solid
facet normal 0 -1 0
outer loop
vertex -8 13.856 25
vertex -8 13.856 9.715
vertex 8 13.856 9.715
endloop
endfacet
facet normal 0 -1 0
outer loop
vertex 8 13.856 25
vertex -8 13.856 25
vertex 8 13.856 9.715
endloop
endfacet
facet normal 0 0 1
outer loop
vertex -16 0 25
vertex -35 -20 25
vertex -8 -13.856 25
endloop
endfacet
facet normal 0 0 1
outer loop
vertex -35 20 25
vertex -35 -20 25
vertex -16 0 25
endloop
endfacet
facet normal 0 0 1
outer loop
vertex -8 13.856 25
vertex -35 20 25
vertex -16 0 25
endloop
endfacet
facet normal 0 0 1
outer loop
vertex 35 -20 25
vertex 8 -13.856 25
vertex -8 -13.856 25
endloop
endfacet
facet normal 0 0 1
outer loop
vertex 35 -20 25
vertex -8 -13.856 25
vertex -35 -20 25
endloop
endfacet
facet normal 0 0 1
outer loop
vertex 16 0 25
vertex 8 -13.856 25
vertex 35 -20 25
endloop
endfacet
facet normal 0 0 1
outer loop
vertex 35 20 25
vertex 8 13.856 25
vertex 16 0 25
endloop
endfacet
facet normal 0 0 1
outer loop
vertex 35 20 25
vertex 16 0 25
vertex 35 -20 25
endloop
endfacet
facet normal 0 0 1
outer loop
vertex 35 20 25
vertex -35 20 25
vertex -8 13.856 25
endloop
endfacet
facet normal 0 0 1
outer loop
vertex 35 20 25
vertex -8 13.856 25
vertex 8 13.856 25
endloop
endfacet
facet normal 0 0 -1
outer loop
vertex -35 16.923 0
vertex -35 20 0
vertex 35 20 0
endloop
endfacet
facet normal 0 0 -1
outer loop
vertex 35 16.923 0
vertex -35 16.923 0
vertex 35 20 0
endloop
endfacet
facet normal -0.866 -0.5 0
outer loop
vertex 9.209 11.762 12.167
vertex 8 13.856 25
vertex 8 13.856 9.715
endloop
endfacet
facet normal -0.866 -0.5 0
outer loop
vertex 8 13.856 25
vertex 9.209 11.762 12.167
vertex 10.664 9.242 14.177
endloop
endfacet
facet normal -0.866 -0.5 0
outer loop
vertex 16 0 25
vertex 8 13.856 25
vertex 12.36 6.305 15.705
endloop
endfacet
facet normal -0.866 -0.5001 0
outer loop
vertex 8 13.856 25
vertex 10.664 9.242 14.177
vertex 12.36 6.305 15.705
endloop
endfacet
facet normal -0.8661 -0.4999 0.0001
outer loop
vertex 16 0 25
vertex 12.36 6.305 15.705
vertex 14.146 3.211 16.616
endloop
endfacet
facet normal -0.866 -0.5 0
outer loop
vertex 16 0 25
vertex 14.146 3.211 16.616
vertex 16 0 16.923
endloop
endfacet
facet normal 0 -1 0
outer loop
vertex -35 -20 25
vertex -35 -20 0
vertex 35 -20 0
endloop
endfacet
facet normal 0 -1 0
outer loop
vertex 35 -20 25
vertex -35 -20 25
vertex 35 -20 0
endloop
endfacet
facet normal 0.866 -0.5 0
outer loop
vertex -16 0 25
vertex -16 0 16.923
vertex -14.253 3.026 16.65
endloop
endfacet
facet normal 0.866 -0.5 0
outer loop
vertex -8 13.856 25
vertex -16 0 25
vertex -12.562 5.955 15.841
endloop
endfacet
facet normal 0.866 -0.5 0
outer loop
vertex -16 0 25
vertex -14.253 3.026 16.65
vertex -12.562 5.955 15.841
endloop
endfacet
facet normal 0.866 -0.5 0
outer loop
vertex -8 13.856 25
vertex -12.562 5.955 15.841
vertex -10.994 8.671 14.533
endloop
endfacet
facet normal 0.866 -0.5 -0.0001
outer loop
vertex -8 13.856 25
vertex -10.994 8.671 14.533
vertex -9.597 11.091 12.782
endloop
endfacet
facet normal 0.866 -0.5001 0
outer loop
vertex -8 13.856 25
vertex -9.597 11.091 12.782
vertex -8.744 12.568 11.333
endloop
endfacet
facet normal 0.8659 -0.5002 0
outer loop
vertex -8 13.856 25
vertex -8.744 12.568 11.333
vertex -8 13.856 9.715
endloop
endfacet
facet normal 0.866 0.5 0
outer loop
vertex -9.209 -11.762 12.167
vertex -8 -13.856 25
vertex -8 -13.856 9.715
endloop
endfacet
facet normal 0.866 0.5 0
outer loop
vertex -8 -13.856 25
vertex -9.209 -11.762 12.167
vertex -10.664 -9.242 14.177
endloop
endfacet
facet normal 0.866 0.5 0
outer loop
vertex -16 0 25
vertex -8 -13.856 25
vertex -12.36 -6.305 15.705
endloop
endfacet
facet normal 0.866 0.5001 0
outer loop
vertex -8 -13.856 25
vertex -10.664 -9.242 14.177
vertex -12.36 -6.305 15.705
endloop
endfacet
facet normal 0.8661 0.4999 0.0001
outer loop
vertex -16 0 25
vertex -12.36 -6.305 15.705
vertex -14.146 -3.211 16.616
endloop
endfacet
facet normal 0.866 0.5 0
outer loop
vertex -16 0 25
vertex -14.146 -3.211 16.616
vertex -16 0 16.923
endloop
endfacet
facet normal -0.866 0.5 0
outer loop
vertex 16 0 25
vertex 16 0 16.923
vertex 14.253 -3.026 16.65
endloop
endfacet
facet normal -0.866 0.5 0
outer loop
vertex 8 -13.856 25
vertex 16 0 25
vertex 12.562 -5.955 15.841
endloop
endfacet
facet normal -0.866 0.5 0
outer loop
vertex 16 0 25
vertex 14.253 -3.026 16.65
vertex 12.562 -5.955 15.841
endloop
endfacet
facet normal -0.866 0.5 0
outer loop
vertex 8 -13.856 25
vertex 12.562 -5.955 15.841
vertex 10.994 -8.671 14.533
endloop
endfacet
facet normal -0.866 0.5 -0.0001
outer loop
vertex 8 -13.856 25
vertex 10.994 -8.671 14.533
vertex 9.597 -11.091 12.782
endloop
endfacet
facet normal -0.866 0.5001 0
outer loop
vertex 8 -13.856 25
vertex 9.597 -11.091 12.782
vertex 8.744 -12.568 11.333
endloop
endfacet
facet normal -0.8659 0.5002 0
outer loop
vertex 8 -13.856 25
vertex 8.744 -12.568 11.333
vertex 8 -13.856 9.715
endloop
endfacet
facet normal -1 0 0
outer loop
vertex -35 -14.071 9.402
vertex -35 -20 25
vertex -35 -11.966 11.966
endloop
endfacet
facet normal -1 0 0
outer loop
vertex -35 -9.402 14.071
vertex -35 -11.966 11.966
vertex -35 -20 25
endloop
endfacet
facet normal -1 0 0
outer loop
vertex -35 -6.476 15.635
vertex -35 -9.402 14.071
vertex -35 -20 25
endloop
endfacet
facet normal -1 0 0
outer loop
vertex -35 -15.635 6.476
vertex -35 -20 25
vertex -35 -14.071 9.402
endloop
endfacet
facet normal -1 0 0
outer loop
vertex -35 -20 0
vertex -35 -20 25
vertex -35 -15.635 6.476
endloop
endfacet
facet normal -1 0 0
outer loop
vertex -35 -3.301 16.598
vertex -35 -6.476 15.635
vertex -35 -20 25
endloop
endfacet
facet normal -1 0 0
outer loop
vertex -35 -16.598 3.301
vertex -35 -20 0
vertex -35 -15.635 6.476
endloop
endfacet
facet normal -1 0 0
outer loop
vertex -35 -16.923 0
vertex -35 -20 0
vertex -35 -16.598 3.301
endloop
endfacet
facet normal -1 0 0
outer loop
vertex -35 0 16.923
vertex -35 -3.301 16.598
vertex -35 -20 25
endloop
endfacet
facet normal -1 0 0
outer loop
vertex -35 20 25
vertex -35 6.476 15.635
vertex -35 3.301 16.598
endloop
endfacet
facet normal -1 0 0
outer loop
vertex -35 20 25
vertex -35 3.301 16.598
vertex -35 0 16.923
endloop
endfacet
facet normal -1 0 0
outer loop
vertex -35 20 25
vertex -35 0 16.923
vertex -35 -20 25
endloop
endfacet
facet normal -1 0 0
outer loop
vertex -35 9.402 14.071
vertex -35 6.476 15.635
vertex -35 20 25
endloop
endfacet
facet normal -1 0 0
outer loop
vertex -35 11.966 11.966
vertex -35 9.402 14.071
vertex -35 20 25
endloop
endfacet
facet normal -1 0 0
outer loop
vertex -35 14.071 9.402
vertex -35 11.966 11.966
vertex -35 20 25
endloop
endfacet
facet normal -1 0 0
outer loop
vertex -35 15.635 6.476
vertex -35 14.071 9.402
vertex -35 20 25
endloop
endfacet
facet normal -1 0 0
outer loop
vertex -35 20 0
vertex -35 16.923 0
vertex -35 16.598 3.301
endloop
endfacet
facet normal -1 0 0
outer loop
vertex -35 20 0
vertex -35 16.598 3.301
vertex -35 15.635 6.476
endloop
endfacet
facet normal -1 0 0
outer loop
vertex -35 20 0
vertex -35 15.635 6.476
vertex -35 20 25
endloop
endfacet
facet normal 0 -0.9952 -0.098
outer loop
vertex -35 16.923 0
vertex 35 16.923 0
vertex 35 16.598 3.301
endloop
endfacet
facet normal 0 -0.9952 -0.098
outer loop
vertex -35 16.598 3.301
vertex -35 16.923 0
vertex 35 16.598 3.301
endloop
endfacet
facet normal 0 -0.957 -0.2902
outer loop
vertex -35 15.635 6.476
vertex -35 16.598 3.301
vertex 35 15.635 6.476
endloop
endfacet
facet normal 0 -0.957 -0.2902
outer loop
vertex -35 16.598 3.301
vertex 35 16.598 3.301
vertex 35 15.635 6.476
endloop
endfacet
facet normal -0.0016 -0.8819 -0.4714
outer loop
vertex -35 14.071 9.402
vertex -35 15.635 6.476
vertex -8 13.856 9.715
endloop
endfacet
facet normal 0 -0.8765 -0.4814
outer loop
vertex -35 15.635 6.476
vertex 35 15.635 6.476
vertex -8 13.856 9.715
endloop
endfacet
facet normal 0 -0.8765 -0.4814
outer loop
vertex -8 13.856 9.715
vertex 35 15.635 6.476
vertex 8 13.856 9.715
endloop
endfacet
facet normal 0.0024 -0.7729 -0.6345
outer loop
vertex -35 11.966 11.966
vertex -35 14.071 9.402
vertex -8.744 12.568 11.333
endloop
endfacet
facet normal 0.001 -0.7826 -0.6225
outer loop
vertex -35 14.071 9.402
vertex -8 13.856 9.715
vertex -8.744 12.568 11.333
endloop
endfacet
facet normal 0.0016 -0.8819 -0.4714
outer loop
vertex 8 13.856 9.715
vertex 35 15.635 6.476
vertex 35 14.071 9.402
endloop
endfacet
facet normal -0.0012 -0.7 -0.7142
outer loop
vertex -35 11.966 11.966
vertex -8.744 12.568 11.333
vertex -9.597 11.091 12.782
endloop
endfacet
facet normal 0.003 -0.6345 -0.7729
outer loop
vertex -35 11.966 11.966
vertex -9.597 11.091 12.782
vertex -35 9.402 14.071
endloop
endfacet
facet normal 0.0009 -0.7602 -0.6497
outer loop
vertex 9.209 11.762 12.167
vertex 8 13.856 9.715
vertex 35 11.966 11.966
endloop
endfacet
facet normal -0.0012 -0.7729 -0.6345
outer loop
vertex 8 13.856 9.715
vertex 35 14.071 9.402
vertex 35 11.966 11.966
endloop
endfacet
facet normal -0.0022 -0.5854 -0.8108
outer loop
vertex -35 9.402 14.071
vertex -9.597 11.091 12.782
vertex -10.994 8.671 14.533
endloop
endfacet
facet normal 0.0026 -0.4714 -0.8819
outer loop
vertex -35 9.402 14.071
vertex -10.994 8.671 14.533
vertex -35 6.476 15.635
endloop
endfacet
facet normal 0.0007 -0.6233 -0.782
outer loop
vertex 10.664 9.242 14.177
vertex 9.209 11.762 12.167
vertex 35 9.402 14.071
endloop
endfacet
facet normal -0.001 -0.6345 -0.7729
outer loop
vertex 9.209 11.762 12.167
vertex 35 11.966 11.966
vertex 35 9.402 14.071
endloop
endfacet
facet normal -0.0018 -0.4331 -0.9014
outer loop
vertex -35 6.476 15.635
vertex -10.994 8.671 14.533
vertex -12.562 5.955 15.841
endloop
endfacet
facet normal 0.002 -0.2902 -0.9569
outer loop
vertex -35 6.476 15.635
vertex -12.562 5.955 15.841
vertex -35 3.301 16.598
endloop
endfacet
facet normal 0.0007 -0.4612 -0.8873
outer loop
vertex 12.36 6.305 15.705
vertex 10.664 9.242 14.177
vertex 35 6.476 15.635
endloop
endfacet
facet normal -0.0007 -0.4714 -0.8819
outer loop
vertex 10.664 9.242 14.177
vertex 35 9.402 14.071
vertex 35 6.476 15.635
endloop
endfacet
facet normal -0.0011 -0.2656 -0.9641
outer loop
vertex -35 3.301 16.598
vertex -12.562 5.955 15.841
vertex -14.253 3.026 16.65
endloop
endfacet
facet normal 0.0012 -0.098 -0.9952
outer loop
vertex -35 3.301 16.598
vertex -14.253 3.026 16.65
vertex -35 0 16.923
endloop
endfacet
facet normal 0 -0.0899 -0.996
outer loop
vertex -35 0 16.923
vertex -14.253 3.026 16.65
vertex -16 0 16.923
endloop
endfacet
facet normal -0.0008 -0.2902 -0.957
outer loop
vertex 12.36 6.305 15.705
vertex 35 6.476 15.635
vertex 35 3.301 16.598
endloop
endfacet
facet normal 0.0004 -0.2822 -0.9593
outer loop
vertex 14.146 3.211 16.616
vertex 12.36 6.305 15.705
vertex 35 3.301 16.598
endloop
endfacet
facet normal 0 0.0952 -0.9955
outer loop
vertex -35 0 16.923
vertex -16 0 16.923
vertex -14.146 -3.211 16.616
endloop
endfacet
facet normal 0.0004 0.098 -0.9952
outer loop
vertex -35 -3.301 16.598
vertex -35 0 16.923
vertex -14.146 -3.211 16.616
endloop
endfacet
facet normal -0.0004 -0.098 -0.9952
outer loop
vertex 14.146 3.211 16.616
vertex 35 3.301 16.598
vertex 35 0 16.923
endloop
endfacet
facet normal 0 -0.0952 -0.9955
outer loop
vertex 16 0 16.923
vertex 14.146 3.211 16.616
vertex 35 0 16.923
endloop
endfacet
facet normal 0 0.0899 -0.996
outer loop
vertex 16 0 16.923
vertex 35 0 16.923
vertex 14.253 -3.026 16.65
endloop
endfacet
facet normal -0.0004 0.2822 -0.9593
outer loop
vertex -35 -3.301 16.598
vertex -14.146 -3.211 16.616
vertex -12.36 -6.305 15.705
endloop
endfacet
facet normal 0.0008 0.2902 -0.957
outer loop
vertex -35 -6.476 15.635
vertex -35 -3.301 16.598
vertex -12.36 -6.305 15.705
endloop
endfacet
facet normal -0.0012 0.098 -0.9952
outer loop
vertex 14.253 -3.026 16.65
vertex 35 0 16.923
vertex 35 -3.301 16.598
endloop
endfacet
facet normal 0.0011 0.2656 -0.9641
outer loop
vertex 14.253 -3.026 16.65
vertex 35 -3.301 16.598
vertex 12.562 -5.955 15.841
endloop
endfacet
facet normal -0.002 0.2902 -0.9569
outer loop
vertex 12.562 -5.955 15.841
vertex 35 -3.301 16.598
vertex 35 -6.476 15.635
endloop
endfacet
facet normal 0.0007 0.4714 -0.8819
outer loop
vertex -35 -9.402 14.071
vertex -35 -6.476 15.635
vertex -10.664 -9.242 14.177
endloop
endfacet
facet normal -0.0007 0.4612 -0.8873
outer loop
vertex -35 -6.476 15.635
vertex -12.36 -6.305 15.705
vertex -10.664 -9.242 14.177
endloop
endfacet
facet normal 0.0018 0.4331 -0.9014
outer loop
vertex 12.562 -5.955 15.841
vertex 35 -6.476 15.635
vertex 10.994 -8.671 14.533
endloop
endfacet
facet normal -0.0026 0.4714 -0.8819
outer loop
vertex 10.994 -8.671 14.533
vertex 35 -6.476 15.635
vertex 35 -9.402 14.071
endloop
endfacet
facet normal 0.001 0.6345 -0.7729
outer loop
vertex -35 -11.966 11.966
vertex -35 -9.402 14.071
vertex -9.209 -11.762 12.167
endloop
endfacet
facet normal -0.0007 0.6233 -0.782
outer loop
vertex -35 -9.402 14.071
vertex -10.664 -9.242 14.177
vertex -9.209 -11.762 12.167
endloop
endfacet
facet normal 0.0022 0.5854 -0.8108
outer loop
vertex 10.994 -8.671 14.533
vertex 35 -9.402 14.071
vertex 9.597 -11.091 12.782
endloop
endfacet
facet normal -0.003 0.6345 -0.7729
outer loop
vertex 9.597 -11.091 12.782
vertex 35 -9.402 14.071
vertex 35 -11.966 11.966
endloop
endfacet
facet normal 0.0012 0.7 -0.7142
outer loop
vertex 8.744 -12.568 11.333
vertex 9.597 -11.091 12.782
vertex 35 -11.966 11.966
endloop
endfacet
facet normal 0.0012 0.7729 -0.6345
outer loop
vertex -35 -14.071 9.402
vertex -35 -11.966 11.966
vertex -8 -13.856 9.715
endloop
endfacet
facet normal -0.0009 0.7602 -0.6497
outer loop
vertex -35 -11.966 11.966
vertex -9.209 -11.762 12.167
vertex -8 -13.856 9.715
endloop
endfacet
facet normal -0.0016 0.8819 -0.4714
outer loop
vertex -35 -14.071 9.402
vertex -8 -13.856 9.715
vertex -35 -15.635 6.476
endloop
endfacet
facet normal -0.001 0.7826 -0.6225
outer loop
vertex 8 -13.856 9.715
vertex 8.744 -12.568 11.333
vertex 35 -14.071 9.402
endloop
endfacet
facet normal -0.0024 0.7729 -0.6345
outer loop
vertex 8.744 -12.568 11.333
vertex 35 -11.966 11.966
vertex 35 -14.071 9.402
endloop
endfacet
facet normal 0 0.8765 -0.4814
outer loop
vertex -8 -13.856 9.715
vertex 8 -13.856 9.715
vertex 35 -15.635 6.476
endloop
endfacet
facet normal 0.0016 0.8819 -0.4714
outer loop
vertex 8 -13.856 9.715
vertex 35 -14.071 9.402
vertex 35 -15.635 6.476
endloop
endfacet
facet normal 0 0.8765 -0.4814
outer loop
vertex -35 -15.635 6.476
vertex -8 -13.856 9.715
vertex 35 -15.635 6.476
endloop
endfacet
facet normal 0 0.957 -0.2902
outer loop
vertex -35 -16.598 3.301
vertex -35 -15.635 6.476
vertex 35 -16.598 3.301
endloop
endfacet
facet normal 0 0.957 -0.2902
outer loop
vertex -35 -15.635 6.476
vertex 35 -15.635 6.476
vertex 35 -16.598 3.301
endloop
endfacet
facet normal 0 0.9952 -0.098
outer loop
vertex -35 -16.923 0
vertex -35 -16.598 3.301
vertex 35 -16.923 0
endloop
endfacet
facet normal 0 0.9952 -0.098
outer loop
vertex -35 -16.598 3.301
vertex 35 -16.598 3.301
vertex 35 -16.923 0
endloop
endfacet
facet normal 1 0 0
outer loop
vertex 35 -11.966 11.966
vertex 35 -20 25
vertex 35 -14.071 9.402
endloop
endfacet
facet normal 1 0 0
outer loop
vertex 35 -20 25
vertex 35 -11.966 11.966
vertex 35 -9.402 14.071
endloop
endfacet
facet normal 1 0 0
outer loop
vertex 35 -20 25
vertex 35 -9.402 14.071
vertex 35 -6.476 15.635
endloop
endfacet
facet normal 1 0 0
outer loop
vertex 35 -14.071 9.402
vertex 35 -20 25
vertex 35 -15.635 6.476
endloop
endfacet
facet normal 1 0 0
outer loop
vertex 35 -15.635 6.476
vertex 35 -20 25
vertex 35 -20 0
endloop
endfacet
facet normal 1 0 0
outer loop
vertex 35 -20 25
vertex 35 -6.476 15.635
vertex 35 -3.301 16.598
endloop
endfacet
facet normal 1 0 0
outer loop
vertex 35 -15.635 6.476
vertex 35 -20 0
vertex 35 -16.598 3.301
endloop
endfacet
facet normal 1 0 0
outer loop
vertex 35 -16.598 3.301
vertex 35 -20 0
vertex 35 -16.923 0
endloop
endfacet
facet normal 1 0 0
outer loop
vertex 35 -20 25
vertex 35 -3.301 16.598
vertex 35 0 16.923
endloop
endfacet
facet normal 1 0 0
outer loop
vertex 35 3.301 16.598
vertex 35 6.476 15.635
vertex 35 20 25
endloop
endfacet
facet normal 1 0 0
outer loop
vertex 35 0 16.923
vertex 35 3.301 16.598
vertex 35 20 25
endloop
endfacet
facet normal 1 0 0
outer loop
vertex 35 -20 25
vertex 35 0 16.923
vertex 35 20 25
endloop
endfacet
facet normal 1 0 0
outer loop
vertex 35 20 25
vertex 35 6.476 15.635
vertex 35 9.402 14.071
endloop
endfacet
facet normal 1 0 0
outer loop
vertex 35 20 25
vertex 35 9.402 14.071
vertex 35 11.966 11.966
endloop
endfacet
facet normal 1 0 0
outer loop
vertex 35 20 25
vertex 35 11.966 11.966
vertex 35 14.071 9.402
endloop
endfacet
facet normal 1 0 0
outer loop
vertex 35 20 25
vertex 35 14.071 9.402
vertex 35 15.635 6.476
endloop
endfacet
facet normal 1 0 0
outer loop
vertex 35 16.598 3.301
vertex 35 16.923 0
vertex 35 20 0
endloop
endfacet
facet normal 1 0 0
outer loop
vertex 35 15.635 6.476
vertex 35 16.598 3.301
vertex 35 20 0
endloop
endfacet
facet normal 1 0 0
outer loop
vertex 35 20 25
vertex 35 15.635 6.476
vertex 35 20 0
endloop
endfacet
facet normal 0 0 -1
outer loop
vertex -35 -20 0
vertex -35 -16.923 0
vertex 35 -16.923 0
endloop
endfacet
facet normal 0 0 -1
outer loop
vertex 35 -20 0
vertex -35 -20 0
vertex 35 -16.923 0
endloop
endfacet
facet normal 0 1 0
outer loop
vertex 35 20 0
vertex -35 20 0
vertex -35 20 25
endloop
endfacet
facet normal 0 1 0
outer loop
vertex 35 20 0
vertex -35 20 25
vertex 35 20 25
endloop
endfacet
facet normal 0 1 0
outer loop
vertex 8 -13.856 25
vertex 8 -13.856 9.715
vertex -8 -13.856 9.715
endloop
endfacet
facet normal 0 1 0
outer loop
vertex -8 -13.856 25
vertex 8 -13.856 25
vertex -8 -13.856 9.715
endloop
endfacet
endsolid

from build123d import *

# Parameters (mm, degrees)
F0_W     = 70
F0_H     = 40
F1_DEPTH = 25
F3_DEPTH = 70.001


with BuildPart() as f1:
    # F0 (on Top) → F1 (new body)
    with BuildSketch(Plane.XY):
        Rectangle(F0_W, F0_H)
        Polygon((-8, -13.856406), (-16, 0), (-8, 13.856406), (8, 13.856406), (16, 0), (8, -13.856406), align=None, mode=Mode.SUBTRACT)
    extrude(amount=F1_DEPTH)

    # F2 (on face) → F3 (cut, through all)
    with BuildSketch(Plane.YZ.offset(35)):
        with BuildLine():
            ThreePointArc((-16.922921, 0), (0, -16.922921), (16.922921, 0))
            Line((16.922921, 0), (-16.922921, 0))
        make_face()
        with BuildLine():
            Line((-16.922921, 0), (16.922921, 0))
            ThreePointArc((16.922921, 0), (0, 16.922921), (-16.922921, 0))
        make_face()
    extrude(amount=-F3_DEPTH, mode=Mode.SUBTRACT)


solid = f1.part
